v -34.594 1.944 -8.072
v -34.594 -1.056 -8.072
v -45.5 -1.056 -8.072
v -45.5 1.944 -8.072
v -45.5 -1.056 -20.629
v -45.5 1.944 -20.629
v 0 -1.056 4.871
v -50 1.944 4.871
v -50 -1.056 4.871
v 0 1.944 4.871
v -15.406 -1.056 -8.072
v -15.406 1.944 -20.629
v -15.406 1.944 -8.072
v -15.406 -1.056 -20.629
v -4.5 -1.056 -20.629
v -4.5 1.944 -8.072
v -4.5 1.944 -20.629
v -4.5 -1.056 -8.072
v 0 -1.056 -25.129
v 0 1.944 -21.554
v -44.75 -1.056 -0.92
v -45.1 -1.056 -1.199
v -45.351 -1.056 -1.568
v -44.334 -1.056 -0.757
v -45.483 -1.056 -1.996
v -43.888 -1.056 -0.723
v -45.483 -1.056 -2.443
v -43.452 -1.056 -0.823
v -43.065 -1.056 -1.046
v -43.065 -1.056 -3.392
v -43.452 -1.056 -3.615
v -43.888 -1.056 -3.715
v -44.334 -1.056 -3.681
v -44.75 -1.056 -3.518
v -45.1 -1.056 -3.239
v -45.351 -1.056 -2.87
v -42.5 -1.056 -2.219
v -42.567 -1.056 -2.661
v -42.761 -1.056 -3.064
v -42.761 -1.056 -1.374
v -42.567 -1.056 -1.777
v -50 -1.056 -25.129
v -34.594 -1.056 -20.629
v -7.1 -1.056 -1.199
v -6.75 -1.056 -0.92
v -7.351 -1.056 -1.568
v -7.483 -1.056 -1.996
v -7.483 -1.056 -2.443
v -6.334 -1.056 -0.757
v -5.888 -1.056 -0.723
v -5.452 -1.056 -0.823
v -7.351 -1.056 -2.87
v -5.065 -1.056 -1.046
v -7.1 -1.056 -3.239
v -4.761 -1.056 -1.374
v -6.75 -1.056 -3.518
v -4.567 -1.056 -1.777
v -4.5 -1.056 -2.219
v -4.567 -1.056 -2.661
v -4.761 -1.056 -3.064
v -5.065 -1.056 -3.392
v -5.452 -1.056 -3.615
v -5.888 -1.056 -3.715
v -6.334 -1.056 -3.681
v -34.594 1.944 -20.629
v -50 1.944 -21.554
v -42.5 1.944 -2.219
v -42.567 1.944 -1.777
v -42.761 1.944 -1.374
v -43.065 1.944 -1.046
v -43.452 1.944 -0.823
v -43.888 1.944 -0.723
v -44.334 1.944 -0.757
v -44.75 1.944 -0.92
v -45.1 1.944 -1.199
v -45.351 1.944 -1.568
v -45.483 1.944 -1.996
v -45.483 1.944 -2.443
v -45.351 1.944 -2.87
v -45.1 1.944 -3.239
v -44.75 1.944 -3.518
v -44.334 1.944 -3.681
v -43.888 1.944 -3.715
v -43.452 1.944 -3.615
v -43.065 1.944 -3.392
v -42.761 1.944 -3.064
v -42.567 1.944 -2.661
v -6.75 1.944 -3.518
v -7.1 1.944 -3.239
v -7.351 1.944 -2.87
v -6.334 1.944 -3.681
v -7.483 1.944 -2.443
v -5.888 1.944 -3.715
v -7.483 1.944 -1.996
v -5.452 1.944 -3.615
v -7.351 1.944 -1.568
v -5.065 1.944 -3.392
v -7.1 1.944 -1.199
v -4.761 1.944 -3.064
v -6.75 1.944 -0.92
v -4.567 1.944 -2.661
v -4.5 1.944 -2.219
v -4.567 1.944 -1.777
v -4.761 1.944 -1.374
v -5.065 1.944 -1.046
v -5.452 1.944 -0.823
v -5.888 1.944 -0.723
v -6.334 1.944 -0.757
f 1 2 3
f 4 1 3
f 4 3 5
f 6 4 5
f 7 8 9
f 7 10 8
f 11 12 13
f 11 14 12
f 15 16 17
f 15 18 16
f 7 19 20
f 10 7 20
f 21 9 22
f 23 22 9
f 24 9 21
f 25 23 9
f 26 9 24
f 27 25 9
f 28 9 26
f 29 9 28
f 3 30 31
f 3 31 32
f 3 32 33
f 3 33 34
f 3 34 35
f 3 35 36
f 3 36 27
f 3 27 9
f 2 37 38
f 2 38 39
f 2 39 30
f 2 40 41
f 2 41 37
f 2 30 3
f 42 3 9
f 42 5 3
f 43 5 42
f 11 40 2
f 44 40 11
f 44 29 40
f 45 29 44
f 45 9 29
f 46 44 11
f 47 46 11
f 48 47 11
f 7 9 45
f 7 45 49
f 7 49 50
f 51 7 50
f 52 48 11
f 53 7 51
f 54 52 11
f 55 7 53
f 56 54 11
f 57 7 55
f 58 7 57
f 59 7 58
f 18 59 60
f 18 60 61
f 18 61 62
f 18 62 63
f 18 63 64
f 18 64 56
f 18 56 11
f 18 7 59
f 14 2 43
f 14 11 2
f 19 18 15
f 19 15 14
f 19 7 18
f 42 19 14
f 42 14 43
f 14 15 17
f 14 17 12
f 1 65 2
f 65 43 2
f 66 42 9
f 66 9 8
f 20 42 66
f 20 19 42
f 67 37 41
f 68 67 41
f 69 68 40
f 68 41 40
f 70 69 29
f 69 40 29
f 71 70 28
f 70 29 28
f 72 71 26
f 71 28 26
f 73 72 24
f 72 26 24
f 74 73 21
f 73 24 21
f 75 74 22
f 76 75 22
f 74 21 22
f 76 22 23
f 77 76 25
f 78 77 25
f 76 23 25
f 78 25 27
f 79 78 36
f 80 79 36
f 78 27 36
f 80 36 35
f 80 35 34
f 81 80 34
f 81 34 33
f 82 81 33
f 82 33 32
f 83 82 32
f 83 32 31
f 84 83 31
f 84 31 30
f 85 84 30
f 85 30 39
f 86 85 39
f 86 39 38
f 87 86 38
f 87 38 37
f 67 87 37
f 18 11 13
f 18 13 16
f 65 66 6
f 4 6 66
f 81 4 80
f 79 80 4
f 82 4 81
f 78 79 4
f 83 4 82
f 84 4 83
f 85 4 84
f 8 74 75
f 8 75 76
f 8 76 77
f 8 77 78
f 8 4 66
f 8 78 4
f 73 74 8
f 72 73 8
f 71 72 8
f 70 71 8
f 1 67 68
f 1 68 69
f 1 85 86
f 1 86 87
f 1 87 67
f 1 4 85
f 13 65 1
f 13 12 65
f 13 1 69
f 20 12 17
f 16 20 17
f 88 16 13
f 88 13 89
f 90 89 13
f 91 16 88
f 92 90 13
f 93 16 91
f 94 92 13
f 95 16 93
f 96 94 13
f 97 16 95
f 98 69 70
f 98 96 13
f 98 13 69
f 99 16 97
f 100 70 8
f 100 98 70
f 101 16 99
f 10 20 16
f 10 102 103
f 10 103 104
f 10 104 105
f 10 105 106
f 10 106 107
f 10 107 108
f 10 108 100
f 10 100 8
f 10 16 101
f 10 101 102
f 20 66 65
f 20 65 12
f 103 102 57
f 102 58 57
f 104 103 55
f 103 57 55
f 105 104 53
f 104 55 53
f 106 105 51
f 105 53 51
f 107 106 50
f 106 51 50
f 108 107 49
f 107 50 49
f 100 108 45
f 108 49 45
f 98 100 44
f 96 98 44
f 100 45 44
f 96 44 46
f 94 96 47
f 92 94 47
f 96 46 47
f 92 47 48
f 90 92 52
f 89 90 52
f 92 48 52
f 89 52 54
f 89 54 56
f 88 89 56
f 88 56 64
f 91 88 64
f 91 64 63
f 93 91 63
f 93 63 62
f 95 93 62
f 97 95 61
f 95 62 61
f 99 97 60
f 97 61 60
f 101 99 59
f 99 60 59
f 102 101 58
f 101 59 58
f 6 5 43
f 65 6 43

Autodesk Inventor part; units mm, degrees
ref_plane "YZ Plane" through (0, 0, 0) normal (1, 0, 0) x (0, 1, 0)
ref_plane "XZ Plane" through (0, 0, 0) normal (0, 1, 0) x (-1, 0, 0)
ref_plane "XY Plane" through (0, 0, 0) normal (0, 0, 1) x (1, 0, 0)
sketch "Sketch1" plane through (0, 0, 0) normal (1, 0, 0) x (0, 1, 0)
  line L0 (1.944, 4.8709) -> (-1.056, 4.8709)
  line L1 (-1.056, 4.8709) -> (-1.056, -25.1291)
  line L2 (-1.056, -25.1291) -> (1.944, -25.1291)
  line L3 (1.944, -25.1291) -> (1.944, 4.8709)
  line L4 (-1.056, -25.1291) -> (9.6963, -12.315)
  point P0 (0, 0)
  point P1 (1.944, -21.5539)
  dimension "d0" = 3
  dimension "d1" = 30
  dimension "d2" = 40
extrude "Extrusion1" add sketch "Sketch1" against normal blind 50 contours L3 L4 L1 L0
sketch "Szkic2" plane through (0, -1.056, -25.1291) normal (0, -1, 0) x (1, 0, 0)
  line L0 (0, 30) -> (0, 0)
  line L1 (0, 30) -> (-50, 30)
  line L2 (-50, 0) -> (-50, 30)
  line L3 (0, 0) -> (-50, 0)
  line L4 (-35.094, 16.557) -> (-35.094, 5.254)
  line L5 (-45, 5) -> (-35.348, 5)
  line L6 (-45, 5) -> (-45, 16.43)
  line L7 (-44.873, 16.557) -> (-35.094, 16.557)
  circle A0 centre (-39.92, 11.35) radius 1
  line L8 (-25, 0) -> (-25, 30)
  line L9 (-35.094, 5.254) -> (-35.348, 5)
  line L10 (-45.5, 16.43) -> (-45.5, 4.5)
  line L11 (-45.5, 4.5) -> (-35.1409, 4.5)
  line L12 (-34.594, 5.0469) -> (-34.594, 17.057)
  line L13 (-34.594, 17.057) -> (-44.873, 17.057)
  line L14 (-35.1409, 4.5) -> (-35.094, 4.5469)
  line L15 (-34.6409, 5) -> (-34.594, 5.0469)
  line L16 (-45.5, 4.5) -> (-34.594, 4.5)
  line L17 (-34.594, 4.5) -> (-34.594, 17.057)
  line L18 (-34.594, 17.057) -> (-45.5, 17.057)
  line L19 (-45.5, 17.057) -> (-45.5, 4.5)
  circle A1 centre (-10.08, 11.35) radius 1
  line L20 (-4.5, 16.43) -> (-4.5, 4.5)
  line L21 (-4.5, 4.5) -> (-14.8591, 4.5)
  line L22 (-15.406, 5.0469) -> (-15.406, 17.057)
  line L23 (-15.406, 17.057) -> (-5.127, 17.057)
  line L24 (-4.5, 4.5) -> (-15.406, 4.5)
  line L25 (-15.406, 4.5) -> (-15.406, 17.057)
  line L26 (-15.406, 17.057) -> (-4.5, 17.057)
  line L27 (-4.5, 17.057) -> (-4.5, 4.5)
  line L28 (0, 4.1492) -> (-50, 4.1492)
  line L29 (-50, 4.1492) -> (-50, 27.66)
  line L30 (-36.5, 27.66) -> (-50, 27.66)
  line L31 (-36.5, 27.66) -> (-36.5, 17.057)
  line L32 (-26.5, 4.66) -> (-36.5, 4.66)
  line L33 (-26.5, 4.66) -> (-26.5, 34.4086)
  line L34 (-23.5, 34.4086) -> (-23.5, 4.66)
  line L35 (-13.5, 4.66) -> (-23.5, 4.66)
  line L36 (-13.5, 4.66) -> (-13.5, 13.5389)
  line L37 (0, 27.66) -> (-13.5, 27.66)
  line L38 (0, 4.1492) -> (0, 27.66)
  line L39 (-50, 4.1492) -> (-44, 4.1492)
  line L40 (-44, 27.66) -> (-50, 27.66)
  line L41 (-50, 27.66) -> (-50, 4.1492)
  line L42 (-50, 27.66) -> (-36.5, 27.66)
  line L43 (-36.5, 27.66) -> (-36.5, 24.66)
  line L44 (-50, 24.66) -> (-50, 27.66)
  circle A2 centre (-10.08, 11.35) radius 1
  circle A3 centre (-39.92, 11.35) radius 1
  line L45 (-6, 27.66) -> (-6, 22.91)
  line L46 (-44, 27.66) -> (-44, 22.91)
  circle A4 centre (-6, 22.91) radius 1.5
  circle A5 centre (-44, 22.91) radius 1.5
  circle A6 centre (-6, 22.91) radius 1.75
  circle A7 centre (-44, 22.91) radius 1.75
  line L47 (-12.975, 17.057) -> (-13.5, 17.057)
  line L48 (-36.5, 17.057) -> (-37.0252, 17.057)
  line L49 (-45.5, 15.557) -> (-45.5, 15.0389)
  line L50 (-37.0252, 13.5389) -> (-36.5, 13.5389)
  line L51 (-36.5, 13.5389) -> (-36.5, 4.66)
  line L52 (-13.5, 13.5389) -> (-12.975, 13.5389)
  line L53 (-4.5, 15.0389) -> (-4.5, 15.557)
  arc A8 (-12, 17.057) -> (-12.975, 16.6969) centre (-12, 15.557) ccw
  line L54 (-12.975, 16.6969) -> (-12.975, 17.057)
  line L55 (-37.0252, 16.697) -> (-37.0252, 17.057)
  arc A9 (-37.0252, 16.697) -> (-38, 17.057) centre (-38, 15.557) ccw
  arc A10 (-44, 17.057) -> (-45.5, 15.557) centre (-44, 15.557) ccw
  arc A11 (-45.5, 15.0389) -> (-44, 13.5389) centre (-44, 15.0389) ccw
  arc A12 (-38, 13.5389) -> (-37.0252, 13.8988) centre (-38, 15.0389) ccw
  line L56 (-37.0252, 13.8988) -> (-37.0252, 13.5389)
  line L57 (-12.975, 13.899) -> (-12.975, 13.5389)
  arc A13 (-12.975, 13.899) -> (-12, 13.5389) centre (-12, 15.0389) ccw
  line L58 (-12, 13.5389) -> (-6, 13.5389)
  arc A14 (-6, 13.5389) -> (-4.5, 15.0389) centre (-6, 15.0389) ccw
  arc A15 (-4.5, 15.557) -> (-6, 17.057) centre (-6, 15.557) ccw
  line L59 (-6, 17.057) -> (-12, 17.057)
  line L60 (-38, 17.057) -> (-44, 17.057)
  line L61 (-44, 13.5389) -> (-38, 13.5389)
  arc A16 (-26.5, 34.4086) -> (-23.5, 34.4086) centre (-25, 35.31) ccw
  line L62 (-13.5, 17.057) -> (-13.5, 27.66)
  point P0 (0, 25.1291)
  point P1 (-45.5, 13.5389)
  point P2 (-4.5, 13.5389)
extrude "Wyciągnięcie proste2" cut sketch "Szkic2" against normal through all contours L35 L36 L52 L57 A13 L58 A14 L20 L21 L24 L25 | L25 L22 L23 L54 A8 A15 L20 A14 L58 A13 L57 L52 L36 L35 | L23 A8 L54 | L32 L51 L50 L56 A12 L61 A11 L10 A10 L13 A9 L55 L12 L17 | L17 L16 L11 L10 A11 L6 L5 L51 L32 | L23 L26 L27 L20 A15 | L5 L6 A11 L61 A12 L56 L50 L51 | L55 A9 L13 | L10 L19 L18 L13 A10 | A0 | A1
sketch "Szkic3" plane through (0, -1.056, -25.1291) normal (0, -1, 0) x (1, 0, 0)
  line L0 (-4.5, 17.057) -> (-4.5, 4.5) projected
  line L1 (-4.5, 4.5) -> (-15.406, 4.5) projected
  line L2 (-15.406, 4.5) -> (-15.406, 17.057) projected
  line L3 (-15.406, 17.057) -> (-4.5, 17.057) projected
  line L4 (-34.594, 17.057) -> (-34.594, 4.5) projected
  line L5 (-34.594, 4.5) -> (-45.5, 4.5) projected
  line L6 (-45.5, 4.5) -> (-45.5, 17.057) projected
  line L7 (-45.5, 17.057) -> (-34.594, 17.057) projected
  line L8 (0, 30) -> (0, 0) projected
  line L9 (0, 30) -> (-50, 30) projected
  line L10 (-50, 0) -> (-50, 30) projected
  line L11 (0, 0) -> (-50, 0) projected
  circle A0 centre (-44, 24.66) radius 1.75 projected
  circle A1 centre (-10.08, 11.35) radius 1 projected
  circle A2 centre (-39.92, 11.35) radius 1 projected
  line L12 (0, 4.1492) -> (-50, 4.1492) projected
  line L13 (-50, 4.1492) -> (-50, 27.66) projected
  line L14 (-36.5, 27.66) -> (-50, 27.66) projected
  line L15 (-36.5, 27.66) -> (-36.5, 17.057) projected
  line L16 (-26.5, 4.66) -> (-36.5, 4.66) projected
  line L17 (-26.5, 4.66) -> (-26.5, 34.4086) projected
  line L18 (-23.5, 34.4086) -> (-23.5, 4.66) projected
  line L19 (-13.5, 4.66) -> (-23.5, 4.66) projected
  line L20 (-13.5, 4.66) -> (-13.5, 13.5389) projected
  line L21 (0, 27.66) -> (-13.5, 27.66) projected
  line L22 (0, 4.1492) -> (0, 27.66) projected
  line L23 (-44, 27.66) -> (-44, 22.91)
  line L24 (-6, 27.66) -> (-6, 22.91)
  circle A3 centre (-44, 22.91) radius 1.5
  circle A4 centre (-6, 22.91) radius 1.5
  circle A5 centre (-6, 22.91) radius 1.75 projected
  circle A6 centre (-44, 22.91) radius 1.75 projected
  line L25 (-12.975, 17.057) -> (-13.5, 17.057) projected
  line L26 (-36.5, 17.057) -> (-37.0252, 17.057) projected
  line L27 (-45.5, 15.557) -> (-45.5, 15.0389) projected
  line L28 (-37.0252, 13.5389) -> (-36.5, 13.5389) projected
  line L29 (-36.5, 13.5389) -> (-36.5, 4.66) projected
  line L30 (-13.5, 13.5389) -> (-12.975, 13.5389) projected
  line L31 (-4.5, 15.0389) -> (-4.5, 15.557) projected
  arc A7 (-12, 17.057) -> (-12.975, 16.6969) centre (-12, 15.557) ccw projected
  line L32 (-12.975, 16.6969) -> (-12.975, 17.057) projected
  line L33 (-37.0252, 16.697) -> (-37.0252, 17.057) projected
  arc A8 (-37.0252, 16.697) -> (-38, 17.057) centre (-38, 15.557) ccw projected
  arc A9 (-44, 17.057) -> (-45.5, 15.557) centre (-44, 15.557) ccw projected
  arc A10 (-45.5, 15.0389) -> (-44, 13.5389) centre (-44, 15.0389) ccw projected
  arc A11 (-38, 13.5389) -> (-37.0252, 13.8988) centre (-38, 15.0389) ccw projected
  line L34 (-37.0252, 13.8988) -> (-37.0252, 13.5389) projected
  line L35 (-12.975, 13.899) -> (-12.975, 13.5389) projected
  arc A12 (-12.975, 13.899) -> (-12, 13.5389) centre (-12, 15.0389) ccw projected
  line L36 (-12, 13.5389) -> (-6, 13.5389) projected
  arc A13 (-6, 13.5389) -> (-4.5, 15.0389) centre (-6, 15.0389) ccw projected
  arc A14 (-4.5, 15.557) -> (-6, 17.057) centre (-6, 15.557) ccw projected
  line L37 (-6, 17.057) -> (-12, 17.057) projected
  line L38 (-38, 17.057) -> (-44, 17.057) projected
  line L39 (-44, 13.5389) -> (-38, 13.5389) projected
  arc A15 (-26.5, 34.4086) -> (-23.5, 34.4086) centre (-25, 35.31) ccw projected
  line L40 (-13.5, 17.057) -> (-13.5, 27.66) projected
  point P0 (0, 25.1291)
  point P1 (-45.5, 13.5389)
  point P2 (-4.5, 13.5389)
  dimension "d13" = 3
  dimension "d14" = 3
extrude "Wyciągnięcie proste3" cut sketch "Szkic3" against normal through all contours A4 | A3 L23 A0 | A0 A3 | A3 A0 L23
properties part number "nozz" material "Stal nierdzewna"
